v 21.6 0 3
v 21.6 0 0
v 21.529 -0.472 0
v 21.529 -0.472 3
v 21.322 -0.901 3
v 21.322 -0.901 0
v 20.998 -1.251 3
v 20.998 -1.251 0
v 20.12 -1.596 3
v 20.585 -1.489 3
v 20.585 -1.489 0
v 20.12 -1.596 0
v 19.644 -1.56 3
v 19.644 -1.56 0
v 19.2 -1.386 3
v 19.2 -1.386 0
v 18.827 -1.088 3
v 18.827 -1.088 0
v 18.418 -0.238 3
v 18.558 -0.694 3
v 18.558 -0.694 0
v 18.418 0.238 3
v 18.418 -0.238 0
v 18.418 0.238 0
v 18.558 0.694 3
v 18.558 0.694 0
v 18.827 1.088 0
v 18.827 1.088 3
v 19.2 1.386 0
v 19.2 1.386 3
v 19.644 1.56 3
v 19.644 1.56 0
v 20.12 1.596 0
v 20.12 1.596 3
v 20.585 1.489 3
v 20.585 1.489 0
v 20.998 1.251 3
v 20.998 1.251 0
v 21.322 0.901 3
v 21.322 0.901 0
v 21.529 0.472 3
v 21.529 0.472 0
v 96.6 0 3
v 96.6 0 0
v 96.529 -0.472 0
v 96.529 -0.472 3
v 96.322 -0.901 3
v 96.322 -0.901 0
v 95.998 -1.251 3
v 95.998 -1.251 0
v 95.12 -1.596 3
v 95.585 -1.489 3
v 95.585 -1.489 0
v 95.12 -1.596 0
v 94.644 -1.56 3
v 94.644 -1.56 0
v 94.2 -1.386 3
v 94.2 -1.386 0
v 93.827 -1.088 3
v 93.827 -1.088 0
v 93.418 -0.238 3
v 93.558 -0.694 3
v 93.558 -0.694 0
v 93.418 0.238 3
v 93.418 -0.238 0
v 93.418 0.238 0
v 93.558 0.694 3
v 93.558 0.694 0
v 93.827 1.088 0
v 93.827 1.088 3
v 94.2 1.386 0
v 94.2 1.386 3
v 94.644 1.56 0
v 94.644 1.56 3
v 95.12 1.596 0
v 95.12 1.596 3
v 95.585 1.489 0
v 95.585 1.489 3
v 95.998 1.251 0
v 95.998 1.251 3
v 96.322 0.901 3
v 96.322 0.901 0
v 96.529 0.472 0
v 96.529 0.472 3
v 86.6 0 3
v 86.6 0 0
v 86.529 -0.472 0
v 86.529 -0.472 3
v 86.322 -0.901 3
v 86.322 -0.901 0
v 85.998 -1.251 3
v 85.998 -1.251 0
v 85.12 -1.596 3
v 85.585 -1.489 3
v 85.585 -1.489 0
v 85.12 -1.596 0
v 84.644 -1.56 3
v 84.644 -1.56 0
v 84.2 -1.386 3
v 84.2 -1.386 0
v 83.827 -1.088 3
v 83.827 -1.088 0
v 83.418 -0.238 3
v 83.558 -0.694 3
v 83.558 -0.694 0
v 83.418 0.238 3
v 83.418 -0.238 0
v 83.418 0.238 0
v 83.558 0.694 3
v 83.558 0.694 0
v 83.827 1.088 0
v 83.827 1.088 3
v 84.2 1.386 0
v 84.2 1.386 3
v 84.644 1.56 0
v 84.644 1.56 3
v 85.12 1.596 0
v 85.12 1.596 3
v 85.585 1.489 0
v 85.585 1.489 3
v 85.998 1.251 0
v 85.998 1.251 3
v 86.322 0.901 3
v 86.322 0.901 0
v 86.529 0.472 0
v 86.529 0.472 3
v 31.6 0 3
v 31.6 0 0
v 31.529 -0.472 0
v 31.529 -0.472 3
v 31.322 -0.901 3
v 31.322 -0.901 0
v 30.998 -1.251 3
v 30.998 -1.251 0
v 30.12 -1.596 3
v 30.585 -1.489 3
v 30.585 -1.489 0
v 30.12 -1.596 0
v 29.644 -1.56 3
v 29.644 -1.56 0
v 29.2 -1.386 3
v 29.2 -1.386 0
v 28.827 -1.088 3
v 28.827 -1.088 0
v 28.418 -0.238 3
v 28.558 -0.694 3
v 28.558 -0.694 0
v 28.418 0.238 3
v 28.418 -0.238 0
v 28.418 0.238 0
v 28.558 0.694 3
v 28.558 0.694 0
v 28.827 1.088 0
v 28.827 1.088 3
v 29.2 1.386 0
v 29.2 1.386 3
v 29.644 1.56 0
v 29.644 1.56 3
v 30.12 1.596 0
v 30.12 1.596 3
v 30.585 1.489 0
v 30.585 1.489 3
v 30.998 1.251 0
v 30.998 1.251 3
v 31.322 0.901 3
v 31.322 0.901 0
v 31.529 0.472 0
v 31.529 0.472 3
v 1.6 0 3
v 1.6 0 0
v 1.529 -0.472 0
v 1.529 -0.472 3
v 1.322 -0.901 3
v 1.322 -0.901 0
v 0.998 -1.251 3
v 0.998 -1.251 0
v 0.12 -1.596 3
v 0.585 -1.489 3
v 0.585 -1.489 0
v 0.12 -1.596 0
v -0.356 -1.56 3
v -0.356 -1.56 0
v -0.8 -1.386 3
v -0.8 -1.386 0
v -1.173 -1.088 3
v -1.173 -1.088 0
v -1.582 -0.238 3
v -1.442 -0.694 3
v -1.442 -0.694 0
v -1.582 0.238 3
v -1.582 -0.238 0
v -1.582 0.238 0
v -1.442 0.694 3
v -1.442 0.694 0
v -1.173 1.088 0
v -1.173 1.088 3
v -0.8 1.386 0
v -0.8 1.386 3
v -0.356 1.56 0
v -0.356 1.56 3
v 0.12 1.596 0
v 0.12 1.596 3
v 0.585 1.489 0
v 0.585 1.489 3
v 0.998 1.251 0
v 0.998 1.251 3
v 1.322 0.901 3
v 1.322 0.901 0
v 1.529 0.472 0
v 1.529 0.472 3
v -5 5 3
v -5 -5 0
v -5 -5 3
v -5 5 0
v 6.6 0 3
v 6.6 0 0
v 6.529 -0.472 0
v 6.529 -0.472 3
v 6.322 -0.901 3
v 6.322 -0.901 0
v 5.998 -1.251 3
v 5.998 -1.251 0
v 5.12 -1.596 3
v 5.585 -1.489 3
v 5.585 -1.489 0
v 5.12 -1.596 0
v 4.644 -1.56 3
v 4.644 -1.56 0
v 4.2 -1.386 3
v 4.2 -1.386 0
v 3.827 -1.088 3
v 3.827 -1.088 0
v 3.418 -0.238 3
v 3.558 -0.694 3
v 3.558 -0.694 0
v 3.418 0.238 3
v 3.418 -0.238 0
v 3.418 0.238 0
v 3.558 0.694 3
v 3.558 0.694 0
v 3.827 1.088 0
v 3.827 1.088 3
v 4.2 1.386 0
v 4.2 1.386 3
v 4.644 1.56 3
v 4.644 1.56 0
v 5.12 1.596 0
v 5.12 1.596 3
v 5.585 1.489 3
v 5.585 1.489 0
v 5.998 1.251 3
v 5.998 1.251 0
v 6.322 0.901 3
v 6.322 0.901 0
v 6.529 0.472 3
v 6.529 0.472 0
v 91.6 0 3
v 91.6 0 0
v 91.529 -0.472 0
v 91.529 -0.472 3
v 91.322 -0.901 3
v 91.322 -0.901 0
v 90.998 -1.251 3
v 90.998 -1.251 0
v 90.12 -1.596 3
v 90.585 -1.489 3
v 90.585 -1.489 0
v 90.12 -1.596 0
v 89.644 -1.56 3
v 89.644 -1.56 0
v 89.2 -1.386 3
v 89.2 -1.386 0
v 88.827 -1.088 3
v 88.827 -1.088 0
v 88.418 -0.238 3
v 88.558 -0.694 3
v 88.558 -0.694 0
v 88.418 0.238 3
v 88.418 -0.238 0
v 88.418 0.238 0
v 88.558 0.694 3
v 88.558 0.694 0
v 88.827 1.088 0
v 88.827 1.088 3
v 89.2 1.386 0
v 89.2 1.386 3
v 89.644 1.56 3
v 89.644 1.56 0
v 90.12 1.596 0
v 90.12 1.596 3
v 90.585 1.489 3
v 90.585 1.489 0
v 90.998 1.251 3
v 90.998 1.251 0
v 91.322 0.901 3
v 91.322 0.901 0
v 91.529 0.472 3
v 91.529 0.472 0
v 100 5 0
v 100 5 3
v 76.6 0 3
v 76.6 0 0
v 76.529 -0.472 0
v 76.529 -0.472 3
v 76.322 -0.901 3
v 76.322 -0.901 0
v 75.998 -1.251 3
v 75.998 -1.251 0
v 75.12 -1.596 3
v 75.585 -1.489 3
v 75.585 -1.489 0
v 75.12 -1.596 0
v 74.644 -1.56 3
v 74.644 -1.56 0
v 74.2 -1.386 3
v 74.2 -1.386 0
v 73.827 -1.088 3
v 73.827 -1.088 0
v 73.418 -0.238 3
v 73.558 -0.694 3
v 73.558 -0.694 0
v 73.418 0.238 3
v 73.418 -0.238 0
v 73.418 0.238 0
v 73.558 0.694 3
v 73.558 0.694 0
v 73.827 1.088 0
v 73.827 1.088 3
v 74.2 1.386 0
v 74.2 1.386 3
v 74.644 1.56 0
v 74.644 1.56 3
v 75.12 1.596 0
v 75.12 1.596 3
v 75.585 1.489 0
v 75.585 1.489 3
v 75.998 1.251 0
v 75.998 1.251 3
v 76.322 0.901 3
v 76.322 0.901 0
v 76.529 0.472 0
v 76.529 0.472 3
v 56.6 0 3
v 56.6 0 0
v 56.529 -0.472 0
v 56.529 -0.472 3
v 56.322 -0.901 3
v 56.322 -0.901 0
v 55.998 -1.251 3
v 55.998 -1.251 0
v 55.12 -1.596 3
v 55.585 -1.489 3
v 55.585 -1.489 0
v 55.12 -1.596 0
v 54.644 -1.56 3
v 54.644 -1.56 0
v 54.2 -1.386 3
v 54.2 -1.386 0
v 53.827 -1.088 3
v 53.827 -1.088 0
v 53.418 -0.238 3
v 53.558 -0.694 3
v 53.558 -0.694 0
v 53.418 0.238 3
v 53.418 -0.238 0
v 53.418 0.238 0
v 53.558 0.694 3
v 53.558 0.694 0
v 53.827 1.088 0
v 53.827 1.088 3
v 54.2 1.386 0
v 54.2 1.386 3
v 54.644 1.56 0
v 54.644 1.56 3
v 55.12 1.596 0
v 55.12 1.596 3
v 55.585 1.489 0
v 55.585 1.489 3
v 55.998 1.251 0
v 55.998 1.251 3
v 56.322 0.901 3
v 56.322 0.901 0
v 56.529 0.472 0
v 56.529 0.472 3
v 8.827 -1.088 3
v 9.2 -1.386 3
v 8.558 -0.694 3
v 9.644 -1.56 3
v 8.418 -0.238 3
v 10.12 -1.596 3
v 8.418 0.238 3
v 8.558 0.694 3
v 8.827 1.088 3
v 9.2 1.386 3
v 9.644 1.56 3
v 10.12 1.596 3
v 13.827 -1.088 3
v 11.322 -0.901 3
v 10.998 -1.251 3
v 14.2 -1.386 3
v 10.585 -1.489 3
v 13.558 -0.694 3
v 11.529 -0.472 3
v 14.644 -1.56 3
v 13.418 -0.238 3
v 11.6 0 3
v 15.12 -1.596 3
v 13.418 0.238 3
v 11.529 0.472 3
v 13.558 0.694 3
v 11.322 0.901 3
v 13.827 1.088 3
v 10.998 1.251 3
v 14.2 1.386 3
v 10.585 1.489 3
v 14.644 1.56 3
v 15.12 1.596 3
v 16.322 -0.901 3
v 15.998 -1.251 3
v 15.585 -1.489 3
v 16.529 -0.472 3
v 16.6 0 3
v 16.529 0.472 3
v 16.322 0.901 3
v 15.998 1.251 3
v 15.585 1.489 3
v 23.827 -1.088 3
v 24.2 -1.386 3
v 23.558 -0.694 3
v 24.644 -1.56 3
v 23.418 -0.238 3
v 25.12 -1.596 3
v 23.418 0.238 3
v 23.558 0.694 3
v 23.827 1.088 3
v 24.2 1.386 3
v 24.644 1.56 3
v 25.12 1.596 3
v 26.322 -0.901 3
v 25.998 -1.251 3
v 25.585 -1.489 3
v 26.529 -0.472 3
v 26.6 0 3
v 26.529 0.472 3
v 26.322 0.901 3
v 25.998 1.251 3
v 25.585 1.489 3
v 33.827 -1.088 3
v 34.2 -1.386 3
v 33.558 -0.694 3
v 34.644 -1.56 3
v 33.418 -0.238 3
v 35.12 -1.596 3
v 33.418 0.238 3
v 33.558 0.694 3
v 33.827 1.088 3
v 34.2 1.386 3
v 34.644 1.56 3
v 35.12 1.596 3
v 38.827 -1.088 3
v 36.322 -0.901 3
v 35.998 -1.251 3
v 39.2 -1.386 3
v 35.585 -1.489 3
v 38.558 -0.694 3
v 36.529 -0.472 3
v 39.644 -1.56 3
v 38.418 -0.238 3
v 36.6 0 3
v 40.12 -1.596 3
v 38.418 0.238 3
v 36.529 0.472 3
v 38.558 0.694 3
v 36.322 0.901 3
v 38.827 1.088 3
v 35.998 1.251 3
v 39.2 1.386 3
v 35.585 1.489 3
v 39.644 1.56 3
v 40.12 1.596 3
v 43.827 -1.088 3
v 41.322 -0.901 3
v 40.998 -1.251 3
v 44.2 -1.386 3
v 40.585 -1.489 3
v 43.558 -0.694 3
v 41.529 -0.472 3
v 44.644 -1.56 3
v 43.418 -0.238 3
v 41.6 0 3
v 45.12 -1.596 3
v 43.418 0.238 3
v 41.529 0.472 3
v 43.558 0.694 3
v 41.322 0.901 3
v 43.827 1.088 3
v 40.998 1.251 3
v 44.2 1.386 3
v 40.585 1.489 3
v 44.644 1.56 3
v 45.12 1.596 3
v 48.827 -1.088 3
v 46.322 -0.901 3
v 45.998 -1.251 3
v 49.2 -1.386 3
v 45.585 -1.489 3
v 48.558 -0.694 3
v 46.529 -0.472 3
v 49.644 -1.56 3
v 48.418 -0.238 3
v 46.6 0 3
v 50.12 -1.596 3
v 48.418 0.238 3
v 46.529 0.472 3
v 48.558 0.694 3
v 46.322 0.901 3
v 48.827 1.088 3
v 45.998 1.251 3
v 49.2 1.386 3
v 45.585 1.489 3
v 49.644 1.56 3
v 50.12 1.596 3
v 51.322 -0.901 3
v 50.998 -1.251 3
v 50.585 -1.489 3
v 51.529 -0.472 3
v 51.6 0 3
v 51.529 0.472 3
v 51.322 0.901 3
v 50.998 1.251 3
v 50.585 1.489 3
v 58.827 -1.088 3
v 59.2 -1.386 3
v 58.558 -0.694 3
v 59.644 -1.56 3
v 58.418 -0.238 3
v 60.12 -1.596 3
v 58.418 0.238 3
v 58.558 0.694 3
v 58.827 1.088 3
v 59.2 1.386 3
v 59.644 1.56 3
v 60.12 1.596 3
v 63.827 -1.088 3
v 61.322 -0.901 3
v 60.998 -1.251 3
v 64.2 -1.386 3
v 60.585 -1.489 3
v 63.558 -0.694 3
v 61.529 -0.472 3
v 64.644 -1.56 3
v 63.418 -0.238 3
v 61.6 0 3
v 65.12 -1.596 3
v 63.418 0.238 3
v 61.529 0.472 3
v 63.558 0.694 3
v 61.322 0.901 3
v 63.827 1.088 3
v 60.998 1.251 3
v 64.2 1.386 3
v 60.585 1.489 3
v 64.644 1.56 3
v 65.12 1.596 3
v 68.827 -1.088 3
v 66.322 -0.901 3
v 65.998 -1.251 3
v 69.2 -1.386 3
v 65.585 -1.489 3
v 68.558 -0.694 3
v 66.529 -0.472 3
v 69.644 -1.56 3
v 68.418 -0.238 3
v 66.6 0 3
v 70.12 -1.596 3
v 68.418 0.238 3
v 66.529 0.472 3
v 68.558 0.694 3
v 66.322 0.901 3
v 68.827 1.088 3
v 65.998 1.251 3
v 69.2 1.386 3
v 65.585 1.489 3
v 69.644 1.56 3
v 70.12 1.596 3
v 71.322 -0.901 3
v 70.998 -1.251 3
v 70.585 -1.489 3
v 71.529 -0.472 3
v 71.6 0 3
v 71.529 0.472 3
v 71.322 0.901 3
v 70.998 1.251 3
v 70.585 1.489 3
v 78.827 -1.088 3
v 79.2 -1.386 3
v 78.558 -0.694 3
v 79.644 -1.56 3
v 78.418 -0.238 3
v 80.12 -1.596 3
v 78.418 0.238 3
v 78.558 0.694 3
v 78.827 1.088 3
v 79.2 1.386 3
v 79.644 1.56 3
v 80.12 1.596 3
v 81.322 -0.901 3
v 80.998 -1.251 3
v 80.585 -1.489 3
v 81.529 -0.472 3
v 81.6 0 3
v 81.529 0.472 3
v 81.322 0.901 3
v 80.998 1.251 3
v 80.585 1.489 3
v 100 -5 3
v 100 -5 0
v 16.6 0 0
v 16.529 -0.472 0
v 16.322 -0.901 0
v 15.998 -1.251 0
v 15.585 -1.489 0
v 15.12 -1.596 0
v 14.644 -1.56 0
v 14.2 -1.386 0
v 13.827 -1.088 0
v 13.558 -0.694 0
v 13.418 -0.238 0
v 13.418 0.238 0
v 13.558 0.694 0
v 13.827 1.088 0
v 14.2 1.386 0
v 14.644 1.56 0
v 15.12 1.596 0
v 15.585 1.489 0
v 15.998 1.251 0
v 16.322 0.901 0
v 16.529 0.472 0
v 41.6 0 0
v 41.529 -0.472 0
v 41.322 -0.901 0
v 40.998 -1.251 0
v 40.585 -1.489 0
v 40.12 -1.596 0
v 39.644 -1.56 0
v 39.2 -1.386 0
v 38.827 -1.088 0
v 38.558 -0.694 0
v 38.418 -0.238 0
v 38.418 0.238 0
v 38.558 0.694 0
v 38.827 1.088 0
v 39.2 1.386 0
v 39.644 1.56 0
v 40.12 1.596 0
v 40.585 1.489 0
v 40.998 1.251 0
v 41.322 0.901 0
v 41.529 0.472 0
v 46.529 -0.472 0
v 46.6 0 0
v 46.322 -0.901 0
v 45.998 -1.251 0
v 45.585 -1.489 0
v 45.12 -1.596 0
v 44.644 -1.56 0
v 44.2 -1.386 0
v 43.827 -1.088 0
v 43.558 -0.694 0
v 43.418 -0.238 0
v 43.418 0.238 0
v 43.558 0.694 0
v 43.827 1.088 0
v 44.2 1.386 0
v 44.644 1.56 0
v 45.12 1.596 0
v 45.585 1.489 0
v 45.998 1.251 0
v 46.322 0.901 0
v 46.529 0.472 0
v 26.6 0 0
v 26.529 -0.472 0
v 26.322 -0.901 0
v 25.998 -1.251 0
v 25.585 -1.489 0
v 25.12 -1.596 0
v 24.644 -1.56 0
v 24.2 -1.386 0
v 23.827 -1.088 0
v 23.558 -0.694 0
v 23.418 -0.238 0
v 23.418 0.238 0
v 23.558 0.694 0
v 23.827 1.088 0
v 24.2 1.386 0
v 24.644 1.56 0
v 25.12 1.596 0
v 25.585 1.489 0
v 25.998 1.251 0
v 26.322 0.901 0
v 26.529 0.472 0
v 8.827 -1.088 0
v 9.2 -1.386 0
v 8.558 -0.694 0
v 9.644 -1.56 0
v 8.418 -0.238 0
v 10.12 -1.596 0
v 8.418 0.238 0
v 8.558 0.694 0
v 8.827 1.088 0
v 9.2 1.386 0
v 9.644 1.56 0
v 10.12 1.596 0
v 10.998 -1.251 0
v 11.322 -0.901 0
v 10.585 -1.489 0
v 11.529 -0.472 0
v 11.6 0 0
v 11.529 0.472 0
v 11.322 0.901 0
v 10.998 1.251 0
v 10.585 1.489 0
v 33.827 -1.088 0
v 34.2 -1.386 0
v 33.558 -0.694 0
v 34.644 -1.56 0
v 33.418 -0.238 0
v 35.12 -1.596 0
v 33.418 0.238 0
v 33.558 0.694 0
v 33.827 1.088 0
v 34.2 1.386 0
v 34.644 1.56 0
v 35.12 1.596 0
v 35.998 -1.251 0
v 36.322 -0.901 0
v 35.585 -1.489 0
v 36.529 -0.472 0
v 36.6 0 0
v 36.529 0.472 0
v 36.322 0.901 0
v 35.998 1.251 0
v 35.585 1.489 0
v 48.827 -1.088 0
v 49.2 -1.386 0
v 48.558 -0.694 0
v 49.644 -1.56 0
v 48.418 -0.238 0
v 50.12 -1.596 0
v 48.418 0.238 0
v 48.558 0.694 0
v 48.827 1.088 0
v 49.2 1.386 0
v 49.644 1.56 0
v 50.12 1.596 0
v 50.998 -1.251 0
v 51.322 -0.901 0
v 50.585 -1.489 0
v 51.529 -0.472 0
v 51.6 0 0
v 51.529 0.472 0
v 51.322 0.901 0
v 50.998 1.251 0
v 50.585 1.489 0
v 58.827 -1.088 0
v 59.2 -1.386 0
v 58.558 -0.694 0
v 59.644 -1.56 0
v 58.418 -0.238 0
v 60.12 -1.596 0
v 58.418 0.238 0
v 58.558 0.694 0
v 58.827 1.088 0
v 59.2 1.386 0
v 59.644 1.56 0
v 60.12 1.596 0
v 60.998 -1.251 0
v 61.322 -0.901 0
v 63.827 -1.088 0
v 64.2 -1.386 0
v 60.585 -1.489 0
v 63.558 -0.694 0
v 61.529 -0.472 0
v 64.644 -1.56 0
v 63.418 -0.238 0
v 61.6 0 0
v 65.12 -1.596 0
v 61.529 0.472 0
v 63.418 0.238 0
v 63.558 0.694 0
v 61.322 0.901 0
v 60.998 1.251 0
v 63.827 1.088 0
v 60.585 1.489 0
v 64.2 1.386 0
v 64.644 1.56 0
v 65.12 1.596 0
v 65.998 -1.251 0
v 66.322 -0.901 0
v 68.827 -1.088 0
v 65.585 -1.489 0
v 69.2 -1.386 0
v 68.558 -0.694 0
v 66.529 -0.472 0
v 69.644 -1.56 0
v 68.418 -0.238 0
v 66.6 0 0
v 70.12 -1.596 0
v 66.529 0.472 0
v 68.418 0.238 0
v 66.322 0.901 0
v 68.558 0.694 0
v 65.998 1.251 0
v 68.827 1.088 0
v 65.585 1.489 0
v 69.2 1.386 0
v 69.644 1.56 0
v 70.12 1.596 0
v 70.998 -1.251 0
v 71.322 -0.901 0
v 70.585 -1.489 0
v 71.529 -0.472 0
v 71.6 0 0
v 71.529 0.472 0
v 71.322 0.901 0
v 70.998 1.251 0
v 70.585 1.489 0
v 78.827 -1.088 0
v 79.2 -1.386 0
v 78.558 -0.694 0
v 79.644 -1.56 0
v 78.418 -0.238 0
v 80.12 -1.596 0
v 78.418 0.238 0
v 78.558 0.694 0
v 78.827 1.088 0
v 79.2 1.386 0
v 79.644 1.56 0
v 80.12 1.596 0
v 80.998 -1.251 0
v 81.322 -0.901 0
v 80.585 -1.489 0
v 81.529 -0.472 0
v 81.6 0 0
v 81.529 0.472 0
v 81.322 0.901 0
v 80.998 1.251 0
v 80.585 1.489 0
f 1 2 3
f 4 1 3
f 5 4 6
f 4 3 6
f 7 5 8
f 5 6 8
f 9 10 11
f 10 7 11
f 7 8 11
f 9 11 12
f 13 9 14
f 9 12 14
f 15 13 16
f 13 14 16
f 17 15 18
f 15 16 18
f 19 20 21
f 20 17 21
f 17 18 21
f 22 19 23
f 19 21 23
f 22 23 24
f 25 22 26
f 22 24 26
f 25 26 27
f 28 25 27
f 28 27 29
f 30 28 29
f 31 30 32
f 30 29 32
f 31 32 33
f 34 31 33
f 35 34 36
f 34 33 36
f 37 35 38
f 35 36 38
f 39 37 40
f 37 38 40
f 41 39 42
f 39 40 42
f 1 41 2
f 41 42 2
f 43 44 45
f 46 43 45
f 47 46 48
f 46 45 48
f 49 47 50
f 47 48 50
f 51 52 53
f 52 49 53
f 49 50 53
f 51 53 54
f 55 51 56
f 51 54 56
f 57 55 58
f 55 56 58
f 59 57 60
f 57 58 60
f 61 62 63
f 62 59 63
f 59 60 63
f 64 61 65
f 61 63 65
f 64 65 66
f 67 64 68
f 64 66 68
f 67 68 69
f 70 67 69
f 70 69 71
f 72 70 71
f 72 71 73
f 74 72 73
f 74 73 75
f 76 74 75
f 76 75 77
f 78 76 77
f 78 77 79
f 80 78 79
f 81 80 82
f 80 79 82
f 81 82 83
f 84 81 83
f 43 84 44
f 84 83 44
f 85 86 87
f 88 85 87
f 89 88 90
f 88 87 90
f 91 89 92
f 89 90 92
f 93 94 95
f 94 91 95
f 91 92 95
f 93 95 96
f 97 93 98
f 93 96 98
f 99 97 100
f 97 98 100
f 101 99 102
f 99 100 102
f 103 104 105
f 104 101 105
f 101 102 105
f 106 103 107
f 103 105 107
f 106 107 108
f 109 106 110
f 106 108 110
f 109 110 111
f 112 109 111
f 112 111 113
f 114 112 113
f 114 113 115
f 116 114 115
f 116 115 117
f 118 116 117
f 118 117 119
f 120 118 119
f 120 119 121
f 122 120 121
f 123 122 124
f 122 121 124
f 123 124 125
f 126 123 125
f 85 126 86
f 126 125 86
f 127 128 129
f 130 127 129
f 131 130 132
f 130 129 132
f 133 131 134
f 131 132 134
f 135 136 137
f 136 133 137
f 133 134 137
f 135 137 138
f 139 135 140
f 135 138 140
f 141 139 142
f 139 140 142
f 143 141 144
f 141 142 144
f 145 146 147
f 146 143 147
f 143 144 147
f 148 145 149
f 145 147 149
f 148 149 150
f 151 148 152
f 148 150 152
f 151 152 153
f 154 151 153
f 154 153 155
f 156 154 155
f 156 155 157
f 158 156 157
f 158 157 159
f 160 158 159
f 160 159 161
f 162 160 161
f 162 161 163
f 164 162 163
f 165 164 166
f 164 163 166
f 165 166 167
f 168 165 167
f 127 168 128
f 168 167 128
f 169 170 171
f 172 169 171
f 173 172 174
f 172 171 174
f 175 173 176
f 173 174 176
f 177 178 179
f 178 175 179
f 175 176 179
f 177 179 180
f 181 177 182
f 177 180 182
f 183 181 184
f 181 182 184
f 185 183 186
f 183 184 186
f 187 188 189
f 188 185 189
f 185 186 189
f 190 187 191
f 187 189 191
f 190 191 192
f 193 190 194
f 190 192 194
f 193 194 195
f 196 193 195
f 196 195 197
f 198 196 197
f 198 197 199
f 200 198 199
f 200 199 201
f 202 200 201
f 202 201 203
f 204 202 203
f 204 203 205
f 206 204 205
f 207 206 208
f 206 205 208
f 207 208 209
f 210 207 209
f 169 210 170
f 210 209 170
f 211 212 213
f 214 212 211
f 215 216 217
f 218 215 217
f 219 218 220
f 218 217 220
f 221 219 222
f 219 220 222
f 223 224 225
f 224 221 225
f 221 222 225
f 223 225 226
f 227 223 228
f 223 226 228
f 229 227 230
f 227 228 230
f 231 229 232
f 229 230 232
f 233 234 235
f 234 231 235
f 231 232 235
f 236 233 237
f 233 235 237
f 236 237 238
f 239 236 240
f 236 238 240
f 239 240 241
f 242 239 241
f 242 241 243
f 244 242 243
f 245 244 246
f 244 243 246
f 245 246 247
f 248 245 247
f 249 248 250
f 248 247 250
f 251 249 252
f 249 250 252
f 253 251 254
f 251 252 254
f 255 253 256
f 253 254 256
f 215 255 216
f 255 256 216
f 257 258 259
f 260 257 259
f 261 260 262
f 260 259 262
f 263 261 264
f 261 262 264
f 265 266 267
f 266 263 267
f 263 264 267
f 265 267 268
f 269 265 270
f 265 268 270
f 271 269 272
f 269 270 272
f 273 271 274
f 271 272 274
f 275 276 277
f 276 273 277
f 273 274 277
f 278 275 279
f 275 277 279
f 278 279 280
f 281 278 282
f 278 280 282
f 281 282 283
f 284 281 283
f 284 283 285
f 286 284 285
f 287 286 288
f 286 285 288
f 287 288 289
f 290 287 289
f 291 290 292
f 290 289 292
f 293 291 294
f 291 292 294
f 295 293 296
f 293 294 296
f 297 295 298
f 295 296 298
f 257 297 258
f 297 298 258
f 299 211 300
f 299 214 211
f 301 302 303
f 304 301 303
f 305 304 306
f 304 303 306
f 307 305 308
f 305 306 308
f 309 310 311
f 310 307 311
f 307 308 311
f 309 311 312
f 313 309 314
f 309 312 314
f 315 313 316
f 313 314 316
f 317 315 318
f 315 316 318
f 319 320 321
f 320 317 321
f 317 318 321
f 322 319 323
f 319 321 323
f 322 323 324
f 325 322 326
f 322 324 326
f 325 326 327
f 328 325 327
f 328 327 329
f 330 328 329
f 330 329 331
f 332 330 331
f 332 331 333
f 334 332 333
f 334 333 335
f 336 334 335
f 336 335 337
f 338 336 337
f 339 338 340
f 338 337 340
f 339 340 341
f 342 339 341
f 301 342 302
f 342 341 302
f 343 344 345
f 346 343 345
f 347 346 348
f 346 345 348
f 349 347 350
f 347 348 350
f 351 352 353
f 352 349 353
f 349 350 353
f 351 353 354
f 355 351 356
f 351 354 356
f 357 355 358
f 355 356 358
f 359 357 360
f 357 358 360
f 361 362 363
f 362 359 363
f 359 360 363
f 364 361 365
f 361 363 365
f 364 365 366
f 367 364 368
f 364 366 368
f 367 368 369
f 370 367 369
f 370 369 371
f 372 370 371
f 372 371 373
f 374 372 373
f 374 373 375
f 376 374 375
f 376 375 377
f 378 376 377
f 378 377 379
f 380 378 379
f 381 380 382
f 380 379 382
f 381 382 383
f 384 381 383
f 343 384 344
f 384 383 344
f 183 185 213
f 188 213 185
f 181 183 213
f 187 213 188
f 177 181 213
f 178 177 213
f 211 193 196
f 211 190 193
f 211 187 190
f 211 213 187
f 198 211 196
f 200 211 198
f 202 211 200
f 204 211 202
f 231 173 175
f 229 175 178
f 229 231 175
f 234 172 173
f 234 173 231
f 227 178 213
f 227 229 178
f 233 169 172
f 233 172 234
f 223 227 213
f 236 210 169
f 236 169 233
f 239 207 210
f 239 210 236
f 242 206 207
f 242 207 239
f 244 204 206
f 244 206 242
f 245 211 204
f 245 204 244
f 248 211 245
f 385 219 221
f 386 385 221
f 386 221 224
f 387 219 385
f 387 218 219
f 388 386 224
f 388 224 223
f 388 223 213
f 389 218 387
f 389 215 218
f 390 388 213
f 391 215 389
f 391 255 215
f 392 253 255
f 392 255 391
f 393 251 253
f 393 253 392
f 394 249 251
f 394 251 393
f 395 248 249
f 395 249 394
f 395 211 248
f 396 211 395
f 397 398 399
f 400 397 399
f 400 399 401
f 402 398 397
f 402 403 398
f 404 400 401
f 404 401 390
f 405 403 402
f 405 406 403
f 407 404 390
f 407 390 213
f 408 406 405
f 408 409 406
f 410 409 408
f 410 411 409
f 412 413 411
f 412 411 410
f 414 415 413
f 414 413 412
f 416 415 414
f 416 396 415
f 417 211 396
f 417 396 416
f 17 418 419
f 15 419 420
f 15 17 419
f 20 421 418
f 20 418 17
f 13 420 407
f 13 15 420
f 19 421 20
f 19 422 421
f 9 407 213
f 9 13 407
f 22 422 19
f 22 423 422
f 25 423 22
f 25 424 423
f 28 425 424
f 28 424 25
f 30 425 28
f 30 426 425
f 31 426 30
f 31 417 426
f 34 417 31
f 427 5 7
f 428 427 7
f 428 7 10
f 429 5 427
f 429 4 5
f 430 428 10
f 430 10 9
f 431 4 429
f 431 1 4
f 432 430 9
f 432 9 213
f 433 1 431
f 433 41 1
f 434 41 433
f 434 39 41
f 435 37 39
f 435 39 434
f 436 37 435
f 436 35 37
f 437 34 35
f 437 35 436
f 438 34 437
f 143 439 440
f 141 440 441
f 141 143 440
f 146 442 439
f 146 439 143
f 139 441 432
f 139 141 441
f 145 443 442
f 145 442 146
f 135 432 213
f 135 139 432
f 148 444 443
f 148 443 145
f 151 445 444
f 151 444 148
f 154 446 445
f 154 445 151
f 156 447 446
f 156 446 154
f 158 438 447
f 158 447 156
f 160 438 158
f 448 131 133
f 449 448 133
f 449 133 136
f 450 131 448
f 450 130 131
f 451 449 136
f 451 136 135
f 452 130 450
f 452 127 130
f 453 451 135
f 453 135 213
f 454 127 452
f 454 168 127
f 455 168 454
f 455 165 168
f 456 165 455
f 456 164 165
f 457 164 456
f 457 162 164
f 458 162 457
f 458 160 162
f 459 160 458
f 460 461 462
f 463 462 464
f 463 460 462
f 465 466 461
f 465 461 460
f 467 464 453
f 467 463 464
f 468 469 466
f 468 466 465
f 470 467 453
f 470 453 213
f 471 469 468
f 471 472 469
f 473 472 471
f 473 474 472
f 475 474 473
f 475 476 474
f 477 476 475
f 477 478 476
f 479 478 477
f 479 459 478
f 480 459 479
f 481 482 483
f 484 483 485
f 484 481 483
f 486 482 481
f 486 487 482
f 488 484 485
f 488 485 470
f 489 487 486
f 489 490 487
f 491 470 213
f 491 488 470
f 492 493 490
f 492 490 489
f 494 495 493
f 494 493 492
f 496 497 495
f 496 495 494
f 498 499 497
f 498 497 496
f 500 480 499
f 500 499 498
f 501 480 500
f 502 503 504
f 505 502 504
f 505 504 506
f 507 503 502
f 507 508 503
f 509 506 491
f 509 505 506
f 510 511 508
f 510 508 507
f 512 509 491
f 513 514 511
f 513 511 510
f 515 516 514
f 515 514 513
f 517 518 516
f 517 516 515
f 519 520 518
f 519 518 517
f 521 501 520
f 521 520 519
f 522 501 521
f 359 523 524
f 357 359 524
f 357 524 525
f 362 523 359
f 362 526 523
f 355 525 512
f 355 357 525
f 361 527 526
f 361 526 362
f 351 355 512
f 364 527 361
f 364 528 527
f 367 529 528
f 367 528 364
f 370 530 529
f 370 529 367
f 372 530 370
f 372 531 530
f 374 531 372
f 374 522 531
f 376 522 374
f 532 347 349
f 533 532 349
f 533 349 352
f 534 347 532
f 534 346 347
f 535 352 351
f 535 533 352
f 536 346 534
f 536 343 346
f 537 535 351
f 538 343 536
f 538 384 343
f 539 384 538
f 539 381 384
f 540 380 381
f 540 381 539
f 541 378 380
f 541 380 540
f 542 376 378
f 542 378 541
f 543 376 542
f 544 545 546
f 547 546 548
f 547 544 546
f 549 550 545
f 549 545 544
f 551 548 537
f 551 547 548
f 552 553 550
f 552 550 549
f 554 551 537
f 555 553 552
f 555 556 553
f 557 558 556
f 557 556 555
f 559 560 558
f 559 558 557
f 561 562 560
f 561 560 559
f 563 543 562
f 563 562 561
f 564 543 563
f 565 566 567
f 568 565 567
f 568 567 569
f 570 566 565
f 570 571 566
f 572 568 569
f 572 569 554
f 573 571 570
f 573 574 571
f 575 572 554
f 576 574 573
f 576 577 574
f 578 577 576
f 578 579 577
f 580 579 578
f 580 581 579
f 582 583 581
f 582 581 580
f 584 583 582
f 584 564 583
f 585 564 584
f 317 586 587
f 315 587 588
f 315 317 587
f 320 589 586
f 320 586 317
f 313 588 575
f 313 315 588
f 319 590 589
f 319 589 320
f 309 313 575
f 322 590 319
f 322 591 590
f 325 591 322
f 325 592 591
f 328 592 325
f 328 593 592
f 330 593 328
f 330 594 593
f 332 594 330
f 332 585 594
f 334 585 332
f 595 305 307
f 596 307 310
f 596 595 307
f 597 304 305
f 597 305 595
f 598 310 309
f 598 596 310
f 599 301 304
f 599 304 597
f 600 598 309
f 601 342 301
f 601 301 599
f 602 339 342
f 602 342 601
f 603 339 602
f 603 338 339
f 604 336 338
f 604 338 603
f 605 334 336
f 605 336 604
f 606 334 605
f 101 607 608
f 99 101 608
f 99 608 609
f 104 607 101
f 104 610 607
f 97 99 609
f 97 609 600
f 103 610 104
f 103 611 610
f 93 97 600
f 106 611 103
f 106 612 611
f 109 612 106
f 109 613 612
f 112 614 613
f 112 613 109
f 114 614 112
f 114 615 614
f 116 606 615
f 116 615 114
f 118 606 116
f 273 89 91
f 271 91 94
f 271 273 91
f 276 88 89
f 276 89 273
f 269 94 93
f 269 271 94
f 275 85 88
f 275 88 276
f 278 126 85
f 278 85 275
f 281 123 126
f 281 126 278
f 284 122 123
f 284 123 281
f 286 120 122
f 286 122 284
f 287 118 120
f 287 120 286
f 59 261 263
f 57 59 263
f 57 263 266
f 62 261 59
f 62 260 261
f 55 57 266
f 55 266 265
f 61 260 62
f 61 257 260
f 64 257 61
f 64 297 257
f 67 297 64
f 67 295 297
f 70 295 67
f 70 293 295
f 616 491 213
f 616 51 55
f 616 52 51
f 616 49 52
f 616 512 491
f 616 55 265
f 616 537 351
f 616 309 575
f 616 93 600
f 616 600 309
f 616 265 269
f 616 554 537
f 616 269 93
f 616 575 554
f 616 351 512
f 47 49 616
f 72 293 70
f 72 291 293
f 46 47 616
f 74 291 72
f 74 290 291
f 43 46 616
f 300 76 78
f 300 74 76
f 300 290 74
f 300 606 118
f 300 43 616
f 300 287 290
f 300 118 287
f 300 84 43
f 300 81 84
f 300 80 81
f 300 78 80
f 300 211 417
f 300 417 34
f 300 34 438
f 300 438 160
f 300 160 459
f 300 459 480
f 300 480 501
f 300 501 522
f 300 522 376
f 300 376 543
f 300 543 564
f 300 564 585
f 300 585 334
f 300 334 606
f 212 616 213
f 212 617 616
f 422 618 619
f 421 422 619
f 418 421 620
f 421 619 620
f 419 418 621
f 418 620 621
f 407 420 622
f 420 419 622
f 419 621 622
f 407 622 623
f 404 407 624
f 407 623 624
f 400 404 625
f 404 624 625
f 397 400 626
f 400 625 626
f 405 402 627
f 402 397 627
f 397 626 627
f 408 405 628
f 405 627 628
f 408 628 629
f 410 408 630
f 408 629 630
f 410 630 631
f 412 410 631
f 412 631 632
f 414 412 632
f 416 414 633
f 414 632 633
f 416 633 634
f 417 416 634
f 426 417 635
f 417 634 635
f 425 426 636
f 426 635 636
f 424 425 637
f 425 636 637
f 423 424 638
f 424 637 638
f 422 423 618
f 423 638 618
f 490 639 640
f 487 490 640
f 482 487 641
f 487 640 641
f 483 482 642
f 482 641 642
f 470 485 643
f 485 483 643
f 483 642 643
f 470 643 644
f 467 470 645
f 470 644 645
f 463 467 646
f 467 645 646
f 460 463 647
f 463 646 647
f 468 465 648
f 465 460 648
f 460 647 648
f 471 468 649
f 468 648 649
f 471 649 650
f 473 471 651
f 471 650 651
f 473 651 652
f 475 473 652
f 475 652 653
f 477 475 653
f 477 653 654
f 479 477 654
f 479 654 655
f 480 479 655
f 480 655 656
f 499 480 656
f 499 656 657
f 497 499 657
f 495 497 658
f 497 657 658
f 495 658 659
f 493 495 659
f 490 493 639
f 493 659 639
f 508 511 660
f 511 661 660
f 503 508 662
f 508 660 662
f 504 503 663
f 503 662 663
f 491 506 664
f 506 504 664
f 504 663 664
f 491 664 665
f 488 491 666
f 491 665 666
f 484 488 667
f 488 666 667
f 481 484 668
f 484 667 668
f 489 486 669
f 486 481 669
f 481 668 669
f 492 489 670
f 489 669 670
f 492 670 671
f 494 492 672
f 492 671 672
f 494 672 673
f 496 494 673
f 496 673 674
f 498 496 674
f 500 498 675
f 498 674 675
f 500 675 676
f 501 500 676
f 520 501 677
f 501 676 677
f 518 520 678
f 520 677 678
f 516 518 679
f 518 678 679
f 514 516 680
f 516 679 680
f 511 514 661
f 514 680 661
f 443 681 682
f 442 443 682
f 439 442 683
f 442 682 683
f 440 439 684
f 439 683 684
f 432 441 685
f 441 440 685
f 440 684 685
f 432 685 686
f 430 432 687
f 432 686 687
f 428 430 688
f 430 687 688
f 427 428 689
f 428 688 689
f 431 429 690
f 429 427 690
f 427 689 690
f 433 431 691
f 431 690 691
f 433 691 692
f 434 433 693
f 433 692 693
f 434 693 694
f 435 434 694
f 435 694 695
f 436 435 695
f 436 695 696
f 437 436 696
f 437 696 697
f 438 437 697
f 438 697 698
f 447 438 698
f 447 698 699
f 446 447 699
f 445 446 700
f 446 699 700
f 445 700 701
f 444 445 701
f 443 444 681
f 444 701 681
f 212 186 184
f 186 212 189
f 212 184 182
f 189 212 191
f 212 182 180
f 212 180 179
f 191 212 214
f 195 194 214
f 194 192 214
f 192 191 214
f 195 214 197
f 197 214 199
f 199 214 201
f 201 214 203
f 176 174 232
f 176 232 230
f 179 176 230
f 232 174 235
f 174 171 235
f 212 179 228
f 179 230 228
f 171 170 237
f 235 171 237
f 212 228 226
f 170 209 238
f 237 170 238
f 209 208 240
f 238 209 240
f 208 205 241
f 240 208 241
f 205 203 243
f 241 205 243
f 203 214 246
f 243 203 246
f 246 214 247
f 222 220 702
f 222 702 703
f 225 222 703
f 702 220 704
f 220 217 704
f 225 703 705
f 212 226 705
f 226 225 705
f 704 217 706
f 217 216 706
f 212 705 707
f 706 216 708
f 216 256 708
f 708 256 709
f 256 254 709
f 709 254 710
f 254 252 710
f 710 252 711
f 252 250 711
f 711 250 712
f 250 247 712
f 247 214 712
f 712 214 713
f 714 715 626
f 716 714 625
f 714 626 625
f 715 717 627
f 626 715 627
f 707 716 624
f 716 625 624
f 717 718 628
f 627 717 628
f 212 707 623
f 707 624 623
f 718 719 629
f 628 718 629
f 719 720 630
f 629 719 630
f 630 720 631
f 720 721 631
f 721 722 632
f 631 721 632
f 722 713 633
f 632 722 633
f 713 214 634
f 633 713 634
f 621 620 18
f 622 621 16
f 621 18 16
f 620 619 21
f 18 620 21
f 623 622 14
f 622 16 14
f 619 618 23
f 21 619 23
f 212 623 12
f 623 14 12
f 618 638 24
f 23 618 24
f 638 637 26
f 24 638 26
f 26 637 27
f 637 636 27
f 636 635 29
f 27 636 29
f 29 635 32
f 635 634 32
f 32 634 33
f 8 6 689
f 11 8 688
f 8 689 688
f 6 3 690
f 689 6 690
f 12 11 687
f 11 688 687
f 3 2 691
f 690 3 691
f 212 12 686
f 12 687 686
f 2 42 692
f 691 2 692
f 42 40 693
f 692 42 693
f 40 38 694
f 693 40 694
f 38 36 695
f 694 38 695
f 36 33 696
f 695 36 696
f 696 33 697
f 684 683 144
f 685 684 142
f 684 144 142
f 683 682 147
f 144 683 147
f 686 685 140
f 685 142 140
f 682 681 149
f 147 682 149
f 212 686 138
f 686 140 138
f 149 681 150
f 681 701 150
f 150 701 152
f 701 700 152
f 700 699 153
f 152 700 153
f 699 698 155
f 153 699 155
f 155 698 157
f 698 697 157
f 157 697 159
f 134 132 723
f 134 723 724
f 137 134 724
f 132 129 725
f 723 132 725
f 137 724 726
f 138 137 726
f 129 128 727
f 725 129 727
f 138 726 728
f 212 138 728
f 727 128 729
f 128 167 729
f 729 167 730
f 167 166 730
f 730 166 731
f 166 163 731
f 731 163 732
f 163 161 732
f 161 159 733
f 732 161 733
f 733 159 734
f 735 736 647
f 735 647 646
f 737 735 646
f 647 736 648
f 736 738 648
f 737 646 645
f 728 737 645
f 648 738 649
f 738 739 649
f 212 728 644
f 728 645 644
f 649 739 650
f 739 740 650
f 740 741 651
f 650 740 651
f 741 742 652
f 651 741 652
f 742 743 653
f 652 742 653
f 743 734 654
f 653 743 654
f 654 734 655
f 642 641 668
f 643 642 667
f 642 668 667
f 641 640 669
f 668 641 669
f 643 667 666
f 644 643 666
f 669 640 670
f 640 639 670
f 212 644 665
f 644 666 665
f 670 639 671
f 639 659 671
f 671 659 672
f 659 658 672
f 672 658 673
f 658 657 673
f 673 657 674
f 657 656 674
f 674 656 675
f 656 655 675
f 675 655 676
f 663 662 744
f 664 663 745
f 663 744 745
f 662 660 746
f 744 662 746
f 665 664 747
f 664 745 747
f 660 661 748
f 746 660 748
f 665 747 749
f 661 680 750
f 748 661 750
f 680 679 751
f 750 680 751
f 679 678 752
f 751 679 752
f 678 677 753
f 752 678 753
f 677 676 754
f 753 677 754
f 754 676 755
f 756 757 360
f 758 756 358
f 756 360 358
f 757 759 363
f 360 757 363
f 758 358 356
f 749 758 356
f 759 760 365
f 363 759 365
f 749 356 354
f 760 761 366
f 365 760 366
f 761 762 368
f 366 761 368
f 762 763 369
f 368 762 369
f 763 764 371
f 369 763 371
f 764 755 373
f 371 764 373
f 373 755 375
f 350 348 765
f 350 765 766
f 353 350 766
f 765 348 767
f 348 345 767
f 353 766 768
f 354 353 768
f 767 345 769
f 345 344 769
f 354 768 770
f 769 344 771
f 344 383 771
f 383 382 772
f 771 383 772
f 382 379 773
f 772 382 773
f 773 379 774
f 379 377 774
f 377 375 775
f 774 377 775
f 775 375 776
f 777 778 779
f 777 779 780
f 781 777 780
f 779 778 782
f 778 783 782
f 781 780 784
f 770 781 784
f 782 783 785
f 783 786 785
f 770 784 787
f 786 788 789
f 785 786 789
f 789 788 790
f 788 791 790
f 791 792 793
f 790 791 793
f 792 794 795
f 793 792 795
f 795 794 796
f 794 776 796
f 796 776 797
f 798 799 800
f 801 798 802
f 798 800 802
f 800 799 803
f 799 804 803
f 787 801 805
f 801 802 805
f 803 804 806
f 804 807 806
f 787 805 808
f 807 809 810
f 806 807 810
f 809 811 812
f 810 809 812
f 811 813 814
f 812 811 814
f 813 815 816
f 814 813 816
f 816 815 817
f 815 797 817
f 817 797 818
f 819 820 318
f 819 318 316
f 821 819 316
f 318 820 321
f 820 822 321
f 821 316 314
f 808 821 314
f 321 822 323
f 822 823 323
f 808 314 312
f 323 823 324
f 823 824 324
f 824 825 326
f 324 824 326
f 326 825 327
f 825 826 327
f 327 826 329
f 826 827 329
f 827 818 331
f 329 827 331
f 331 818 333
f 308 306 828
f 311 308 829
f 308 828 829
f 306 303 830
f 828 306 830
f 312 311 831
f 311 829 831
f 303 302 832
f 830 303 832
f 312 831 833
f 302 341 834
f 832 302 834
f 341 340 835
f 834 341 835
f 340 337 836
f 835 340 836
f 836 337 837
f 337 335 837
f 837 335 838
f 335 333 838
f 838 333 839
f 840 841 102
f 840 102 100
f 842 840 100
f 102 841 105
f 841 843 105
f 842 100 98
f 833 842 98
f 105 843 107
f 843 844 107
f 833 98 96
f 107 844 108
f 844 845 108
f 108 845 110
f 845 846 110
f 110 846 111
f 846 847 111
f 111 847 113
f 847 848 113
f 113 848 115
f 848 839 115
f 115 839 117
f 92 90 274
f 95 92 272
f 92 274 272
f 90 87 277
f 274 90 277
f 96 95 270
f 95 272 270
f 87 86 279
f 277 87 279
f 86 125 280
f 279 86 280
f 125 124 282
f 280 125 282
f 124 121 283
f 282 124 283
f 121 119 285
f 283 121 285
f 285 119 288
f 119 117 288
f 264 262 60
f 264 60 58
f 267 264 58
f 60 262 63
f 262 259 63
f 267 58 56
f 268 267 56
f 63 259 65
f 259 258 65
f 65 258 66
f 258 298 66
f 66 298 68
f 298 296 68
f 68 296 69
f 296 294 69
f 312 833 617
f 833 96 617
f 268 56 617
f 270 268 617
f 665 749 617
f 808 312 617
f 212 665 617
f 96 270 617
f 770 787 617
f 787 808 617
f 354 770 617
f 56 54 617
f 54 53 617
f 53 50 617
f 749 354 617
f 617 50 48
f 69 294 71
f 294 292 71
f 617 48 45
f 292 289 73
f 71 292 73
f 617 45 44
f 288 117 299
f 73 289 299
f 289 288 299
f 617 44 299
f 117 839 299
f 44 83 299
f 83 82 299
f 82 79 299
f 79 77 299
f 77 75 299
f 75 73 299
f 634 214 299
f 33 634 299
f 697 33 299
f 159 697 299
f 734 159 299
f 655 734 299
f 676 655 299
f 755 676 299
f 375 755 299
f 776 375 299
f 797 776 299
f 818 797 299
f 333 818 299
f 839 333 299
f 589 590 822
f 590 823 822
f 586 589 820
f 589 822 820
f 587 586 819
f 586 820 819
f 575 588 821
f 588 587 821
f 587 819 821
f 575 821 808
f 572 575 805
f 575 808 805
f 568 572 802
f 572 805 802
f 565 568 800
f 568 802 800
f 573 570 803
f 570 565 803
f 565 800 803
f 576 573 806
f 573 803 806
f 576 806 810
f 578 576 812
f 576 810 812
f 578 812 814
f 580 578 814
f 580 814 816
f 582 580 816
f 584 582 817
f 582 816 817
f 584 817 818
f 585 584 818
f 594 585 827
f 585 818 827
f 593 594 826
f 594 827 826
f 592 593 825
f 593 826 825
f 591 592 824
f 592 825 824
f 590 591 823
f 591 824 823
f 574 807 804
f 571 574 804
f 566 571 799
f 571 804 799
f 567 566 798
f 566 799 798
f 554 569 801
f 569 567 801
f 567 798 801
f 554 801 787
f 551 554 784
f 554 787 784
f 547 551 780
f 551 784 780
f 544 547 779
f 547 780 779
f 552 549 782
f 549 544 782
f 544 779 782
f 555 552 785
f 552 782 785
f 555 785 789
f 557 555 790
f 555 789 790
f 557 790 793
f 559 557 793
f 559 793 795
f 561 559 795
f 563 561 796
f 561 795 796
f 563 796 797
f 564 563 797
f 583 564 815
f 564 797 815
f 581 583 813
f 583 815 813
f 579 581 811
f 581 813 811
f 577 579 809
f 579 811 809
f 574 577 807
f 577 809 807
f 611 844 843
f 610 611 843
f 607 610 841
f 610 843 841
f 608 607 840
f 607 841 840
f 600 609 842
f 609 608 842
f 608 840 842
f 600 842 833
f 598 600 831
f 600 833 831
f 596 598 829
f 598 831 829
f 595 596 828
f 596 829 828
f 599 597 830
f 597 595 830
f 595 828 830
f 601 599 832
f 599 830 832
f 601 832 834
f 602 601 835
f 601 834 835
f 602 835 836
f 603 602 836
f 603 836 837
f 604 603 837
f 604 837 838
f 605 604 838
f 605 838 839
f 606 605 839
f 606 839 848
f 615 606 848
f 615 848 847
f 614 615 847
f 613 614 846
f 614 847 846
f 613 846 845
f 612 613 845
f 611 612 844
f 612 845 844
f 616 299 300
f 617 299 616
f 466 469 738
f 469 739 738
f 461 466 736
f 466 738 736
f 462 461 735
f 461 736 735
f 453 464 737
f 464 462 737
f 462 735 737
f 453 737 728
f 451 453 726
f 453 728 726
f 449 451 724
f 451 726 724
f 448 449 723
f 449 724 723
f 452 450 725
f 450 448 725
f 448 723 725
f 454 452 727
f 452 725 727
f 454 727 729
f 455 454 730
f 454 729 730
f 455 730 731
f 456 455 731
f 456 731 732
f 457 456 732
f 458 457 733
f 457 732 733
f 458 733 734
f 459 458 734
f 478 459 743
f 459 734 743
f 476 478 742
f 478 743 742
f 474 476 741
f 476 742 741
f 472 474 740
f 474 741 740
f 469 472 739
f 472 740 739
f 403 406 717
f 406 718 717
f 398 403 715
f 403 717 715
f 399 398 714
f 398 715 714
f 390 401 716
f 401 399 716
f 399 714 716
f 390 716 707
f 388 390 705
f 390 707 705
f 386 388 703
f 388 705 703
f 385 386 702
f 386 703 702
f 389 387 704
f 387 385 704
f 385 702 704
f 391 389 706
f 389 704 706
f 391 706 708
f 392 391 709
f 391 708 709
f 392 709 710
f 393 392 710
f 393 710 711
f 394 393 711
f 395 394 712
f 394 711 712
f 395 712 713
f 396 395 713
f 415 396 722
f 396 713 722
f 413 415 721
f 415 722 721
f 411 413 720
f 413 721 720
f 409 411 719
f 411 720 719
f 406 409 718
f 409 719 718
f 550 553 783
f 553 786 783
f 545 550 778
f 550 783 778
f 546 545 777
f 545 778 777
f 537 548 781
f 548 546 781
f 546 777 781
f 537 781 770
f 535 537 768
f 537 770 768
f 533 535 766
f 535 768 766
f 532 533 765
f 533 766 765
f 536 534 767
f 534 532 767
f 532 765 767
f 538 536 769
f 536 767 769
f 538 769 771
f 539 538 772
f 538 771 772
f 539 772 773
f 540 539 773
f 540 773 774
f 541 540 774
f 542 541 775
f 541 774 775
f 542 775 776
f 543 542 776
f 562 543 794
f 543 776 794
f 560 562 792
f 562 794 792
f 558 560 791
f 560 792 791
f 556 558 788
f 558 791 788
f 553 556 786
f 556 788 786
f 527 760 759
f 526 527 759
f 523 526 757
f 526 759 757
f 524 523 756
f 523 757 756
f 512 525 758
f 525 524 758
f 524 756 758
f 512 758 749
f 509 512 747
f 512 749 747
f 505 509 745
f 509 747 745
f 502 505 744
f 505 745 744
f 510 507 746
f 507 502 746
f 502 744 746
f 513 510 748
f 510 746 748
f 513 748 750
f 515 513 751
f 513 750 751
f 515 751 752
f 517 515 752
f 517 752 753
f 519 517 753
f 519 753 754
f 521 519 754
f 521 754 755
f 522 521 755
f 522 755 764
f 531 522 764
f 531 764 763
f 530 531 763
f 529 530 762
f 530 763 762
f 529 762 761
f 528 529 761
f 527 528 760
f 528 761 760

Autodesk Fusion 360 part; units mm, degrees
sketch "Sketch1" plane through (0, 0, 0) normal (0, 0, 1) x (1, 0, 0)
  circle A0 centre (0, 0) radius 1.6
  line L0 (-5, 5) -> (100, 5)
  line L1 (100, 5) -> (100, -5)
  line L2 (100, -5) -> (-5, -5)
  line L3 (-5, -5) -> (-5, 5)
  line L4 (-5, 0) -> (100, 0) construction
  circle A1 centre (5, 0) radius 1.6
  circle A2 centre (10, 0) radius 1.6
  circle A3 centre (15, 0) radius 1.6
  circle A4 centre (20, 0) radius 1.6
  circle A5 centre (25, 0) radius 1.6
  circle A6 centre (30, 0) radius 1.6
  circle A7 centre (35, 0) radius 1.6
  circle A8 centre (40, 0) radius 1.6
  circle A9 centre (45, 0) radius 1.6
  circle A10 centre (50, 0) radius 1.6
  circle A11 centre (55, 0) radius 1.6
  circle A12 centre (60, 0) radius 1.6
  circle A13 centre (65, 0) radius 1.6
  circle A14 centre (70, 0) radius 1.6
  circle A15 centre (75, 0) radius 1.6
  circle A16 centre (80, 0) radius 1.6
  circle A17 centre (85, 0) radius 1.6
  circle A18 centre (90, 0) radius 1.6
  circle A19 centre (95, 0) radius 1.6
  dimension "d56" = 3.2
  dimension "d57" = 5
  dimension "d58" = 10
  dimension "d59" = 105
  dimension "d62" = 5
  dimension "d63" = 0
extrude "Extrude1" add sketch "Sketch1" along normal blind 3
move_body "Move1" [suppressed]
equation "d56 = HoleDiameter"
equation "d57 = HoleSpacing"
equation "d58 = LegWidth"
equation "d59 = LegsJointLength"
equation "d60 = LegsJointLength / HoleSpacing - 1"
equation "d62 = HoleSpacing"
equation "d64 = Thickness"
equation "HoleDiameter = 3.2 mm"
equation "Thickness = 3 mm"
equation "HoleSpacing = 5 mm"
equation "LegWidth = 10 mm"
equation "LegsJointLength = 105 mm"
